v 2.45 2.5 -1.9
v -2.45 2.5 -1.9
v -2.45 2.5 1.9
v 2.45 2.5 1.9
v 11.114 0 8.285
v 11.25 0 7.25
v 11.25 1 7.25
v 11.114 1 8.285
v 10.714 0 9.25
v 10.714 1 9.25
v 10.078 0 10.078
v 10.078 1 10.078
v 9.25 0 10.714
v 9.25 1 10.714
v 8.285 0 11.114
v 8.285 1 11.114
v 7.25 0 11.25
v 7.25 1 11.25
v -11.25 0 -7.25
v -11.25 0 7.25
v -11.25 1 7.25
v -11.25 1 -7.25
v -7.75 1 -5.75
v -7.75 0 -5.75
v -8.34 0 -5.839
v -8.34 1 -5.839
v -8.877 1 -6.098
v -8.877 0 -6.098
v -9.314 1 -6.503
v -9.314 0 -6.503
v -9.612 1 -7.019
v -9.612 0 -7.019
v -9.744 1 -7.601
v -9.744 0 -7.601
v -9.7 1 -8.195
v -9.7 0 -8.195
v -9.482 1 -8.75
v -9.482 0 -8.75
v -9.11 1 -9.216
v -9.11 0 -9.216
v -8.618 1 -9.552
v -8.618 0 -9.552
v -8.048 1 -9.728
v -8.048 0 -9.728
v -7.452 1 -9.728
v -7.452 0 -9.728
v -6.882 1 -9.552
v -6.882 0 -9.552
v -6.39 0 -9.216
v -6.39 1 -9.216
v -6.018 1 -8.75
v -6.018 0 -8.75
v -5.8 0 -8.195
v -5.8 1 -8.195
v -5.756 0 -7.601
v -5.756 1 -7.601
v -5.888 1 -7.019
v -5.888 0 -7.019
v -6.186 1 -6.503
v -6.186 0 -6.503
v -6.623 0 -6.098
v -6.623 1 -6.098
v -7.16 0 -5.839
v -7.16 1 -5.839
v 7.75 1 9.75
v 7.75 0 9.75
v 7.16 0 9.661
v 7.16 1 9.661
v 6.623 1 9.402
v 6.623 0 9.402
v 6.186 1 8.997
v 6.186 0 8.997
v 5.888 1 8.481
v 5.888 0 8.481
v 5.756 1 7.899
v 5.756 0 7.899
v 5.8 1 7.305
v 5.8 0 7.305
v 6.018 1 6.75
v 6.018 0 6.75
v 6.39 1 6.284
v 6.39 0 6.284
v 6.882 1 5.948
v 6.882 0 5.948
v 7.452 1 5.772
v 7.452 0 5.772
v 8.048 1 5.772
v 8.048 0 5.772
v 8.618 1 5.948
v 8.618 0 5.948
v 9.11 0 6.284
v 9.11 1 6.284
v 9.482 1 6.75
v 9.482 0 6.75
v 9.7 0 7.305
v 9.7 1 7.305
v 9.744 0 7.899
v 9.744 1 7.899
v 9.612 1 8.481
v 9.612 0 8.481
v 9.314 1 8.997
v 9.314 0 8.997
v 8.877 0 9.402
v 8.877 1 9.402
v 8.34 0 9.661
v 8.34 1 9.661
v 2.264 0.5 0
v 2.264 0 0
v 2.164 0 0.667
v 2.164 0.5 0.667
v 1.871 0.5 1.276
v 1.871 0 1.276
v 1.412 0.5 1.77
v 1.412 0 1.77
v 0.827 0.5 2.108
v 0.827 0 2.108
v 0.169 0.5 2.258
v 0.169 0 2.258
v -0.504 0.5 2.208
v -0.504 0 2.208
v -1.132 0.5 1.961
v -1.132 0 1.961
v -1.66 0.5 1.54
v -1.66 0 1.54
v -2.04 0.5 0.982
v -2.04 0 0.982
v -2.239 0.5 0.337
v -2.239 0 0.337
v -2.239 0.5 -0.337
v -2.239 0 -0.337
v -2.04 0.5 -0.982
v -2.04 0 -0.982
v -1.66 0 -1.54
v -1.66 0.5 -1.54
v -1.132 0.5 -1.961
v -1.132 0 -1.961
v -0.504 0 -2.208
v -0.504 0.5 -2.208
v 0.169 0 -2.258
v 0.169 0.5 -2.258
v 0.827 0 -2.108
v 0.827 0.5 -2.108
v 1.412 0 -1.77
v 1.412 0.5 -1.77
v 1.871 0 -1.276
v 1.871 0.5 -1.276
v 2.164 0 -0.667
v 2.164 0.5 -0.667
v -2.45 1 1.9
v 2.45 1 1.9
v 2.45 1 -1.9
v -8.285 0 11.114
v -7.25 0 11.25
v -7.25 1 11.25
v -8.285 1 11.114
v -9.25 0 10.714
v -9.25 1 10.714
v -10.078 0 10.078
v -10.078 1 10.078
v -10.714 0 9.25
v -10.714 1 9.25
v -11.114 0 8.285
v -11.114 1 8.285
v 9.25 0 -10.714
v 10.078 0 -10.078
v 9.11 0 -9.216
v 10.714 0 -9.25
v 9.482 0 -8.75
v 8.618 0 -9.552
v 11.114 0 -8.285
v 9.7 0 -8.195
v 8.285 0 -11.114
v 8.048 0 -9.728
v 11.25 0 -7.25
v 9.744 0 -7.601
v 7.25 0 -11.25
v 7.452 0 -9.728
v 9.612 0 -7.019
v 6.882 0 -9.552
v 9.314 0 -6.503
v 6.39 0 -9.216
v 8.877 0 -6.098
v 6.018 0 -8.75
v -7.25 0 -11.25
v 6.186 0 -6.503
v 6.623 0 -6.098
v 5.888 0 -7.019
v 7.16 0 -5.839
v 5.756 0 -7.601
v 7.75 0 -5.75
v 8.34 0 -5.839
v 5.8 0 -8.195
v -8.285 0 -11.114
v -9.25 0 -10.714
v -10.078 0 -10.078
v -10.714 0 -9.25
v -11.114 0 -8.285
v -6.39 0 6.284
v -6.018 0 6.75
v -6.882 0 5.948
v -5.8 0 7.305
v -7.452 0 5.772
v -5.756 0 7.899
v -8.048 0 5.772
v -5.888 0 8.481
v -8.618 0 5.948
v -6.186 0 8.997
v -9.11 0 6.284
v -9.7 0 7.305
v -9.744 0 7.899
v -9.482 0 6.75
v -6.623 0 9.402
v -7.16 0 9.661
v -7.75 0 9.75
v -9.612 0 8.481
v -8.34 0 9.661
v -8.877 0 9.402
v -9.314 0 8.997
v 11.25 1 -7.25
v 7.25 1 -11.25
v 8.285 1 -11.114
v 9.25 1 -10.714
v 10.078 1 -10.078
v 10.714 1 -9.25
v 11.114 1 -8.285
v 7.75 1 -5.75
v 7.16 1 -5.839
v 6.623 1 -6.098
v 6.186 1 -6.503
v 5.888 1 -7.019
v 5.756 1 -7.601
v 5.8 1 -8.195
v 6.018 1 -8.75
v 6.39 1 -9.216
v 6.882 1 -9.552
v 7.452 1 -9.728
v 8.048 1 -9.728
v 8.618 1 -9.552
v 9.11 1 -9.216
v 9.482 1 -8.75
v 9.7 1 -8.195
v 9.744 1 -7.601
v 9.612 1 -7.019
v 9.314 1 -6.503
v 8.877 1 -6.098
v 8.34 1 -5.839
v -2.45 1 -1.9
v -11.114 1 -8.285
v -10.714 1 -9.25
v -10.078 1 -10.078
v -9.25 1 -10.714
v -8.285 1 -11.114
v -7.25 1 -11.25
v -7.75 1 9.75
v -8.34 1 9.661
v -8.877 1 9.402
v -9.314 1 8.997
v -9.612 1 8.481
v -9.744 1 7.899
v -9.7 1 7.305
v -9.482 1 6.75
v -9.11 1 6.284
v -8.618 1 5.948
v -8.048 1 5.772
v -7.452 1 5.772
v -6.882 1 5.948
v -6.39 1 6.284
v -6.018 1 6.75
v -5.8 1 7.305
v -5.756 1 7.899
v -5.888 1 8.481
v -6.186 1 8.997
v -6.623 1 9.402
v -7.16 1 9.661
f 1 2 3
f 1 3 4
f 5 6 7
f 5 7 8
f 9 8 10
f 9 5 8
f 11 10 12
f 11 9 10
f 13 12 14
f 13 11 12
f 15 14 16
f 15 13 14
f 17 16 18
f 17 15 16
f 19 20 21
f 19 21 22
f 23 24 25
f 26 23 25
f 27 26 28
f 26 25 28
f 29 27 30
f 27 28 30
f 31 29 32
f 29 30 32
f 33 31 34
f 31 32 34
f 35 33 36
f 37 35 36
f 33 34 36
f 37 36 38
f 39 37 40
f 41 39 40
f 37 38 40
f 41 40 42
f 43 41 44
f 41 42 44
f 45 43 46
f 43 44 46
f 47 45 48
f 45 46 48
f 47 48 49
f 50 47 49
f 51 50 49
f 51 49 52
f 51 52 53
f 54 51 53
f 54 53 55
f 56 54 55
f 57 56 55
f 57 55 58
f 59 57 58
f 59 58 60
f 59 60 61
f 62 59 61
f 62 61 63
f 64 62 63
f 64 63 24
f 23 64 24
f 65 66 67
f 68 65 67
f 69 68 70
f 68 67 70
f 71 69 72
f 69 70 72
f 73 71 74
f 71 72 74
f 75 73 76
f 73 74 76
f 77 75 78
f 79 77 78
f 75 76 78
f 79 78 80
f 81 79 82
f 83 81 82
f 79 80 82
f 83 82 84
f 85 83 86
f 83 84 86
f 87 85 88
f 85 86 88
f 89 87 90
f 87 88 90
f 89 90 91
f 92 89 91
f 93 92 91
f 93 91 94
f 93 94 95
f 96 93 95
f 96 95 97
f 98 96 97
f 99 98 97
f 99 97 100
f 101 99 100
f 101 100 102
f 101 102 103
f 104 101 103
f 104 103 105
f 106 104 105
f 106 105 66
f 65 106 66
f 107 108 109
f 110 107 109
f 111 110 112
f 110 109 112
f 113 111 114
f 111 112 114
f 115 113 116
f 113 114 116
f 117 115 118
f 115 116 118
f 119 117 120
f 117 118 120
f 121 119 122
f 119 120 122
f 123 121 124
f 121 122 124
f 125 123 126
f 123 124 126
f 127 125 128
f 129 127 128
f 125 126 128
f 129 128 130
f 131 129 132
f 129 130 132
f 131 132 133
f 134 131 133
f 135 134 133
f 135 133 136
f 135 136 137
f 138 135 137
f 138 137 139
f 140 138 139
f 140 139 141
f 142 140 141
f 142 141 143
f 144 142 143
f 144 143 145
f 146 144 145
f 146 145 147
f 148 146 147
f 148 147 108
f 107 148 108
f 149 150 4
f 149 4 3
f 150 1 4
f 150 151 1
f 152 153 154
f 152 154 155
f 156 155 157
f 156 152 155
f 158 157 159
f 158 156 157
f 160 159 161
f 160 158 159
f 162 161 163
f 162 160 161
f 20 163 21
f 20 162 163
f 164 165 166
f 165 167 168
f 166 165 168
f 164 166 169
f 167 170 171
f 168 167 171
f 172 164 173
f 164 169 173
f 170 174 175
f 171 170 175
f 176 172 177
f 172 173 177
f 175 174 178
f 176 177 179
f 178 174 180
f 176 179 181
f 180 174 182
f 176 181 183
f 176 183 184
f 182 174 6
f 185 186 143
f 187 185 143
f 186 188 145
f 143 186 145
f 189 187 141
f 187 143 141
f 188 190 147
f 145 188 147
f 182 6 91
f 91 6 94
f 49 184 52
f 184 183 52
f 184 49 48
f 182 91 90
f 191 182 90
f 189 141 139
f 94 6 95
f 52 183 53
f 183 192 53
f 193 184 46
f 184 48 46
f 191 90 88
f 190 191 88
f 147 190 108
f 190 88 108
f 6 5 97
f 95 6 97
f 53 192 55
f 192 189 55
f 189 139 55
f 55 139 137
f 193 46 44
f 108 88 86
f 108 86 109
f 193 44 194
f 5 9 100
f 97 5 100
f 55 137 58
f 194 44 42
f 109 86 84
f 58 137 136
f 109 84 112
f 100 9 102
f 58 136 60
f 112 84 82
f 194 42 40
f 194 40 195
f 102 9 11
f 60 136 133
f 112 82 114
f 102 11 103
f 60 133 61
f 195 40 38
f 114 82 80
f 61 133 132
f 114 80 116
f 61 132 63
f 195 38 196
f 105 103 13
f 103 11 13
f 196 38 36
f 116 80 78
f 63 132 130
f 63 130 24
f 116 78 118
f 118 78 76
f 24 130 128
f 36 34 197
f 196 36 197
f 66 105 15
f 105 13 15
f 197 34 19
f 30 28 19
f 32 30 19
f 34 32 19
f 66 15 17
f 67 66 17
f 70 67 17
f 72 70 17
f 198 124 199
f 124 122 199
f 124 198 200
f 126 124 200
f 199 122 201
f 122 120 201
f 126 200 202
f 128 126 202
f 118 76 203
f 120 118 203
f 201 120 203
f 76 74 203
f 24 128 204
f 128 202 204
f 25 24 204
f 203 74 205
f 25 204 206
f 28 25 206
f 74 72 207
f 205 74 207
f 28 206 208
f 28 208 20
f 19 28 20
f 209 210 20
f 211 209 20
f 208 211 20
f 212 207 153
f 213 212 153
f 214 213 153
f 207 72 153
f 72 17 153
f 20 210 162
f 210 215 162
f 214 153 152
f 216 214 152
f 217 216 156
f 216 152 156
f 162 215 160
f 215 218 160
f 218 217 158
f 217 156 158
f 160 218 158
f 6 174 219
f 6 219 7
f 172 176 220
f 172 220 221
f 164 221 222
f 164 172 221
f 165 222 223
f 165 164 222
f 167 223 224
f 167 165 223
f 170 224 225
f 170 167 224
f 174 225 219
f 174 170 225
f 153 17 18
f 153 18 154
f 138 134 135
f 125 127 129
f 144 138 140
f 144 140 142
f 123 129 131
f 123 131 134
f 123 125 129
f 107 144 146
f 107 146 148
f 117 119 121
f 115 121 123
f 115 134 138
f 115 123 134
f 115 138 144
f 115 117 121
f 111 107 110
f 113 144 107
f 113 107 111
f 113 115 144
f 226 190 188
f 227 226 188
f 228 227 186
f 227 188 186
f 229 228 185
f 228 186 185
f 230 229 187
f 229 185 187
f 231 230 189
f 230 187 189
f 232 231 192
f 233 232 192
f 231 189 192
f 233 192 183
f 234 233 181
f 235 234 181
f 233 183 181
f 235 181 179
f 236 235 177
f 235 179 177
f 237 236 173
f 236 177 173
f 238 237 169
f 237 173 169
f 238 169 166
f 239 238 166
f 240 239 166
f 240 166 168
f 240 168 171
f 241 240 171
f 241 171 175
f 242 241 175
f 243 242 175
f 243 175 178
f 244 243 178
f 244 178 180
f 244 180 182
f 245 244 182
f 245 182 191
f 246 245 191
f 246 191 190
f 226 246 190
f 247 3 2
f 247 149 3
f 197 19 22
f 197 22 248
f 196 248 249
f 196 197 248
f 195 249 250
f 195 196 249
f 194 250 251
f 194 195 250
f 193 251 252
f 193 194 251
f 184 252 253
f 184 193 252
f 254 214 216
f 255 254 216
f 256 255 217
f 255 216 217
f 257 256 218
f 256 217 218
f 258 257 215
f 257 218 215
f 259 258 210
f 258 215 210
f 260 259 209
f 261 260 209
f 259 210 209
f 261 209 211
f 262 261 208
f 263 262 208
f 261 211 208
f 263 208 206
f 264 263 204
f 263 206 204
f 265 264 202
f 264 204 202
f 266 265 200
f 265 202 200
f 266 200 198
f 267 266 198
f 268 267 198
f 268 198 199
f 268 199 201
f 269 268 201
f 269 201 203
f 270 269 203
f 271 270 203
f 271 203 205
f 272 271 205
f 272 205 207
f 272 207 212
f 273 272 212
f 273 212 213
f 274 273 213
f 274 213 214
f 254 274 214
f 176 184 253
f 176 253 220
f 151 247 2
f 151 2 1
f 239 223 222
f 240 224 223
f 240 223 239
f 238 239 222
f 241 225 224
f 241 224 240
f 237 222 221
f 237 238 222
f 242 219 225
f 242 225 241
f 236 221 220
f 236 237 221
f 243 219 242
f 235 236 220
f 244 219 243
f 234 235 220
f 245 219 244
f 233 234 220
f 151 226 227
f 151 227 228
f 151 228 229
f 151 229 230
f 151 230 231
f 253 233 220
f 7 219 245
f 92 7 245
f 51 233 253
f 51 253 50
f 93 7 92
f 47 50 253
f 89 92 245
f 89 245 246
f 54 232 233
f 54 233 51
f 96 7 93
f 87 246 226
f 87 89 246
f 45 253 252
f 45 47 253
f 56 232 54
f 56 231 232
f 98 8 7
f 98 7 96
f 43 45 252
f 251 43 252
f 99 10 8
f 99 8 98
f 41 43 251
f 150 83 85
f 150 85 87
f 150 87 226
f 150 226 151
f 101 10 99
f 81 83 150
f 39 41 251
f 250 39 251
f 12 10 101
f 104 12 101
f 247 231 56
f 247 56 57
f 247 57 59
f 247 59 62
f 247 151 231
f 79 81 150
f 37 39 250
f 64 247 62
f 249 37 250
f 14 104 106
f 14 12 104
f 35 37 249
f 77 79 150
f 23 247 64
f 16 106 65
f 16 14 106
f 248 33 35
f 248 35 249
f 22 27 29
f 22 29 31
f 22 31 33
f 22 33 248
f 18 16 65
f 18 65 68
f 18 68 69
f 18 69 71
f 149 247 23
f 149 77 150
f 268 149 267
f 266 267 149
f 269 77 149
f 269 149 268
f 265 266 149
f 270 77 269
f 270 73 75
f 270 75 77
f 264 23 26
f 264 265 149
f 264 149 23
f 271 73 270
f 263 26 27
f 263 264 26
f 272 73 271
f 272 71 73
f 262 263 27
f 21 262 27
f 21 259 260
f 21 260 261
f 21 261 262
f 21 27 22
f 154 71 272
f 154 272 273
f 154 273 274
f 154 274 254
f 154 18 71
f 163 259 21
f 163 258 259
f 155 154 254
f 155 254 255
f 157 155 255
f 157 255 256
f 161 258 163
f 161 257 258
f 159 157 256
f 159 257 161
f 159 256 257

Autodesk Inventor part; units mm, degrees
ref_plane "YZ Plane" through (0, 0, 0) normal (1, 0, 0) x (0, 1, 0)
ref_plane "XZ Plane" through (0, 0, 0) normal (0, 1, 0) x (-1, 0, 0)
ref_plane "XY Plane" through (0, 0, 0) normal (0, 0, 1) x (1, 0, 0)
sketch "Skizze1" plane through (0, 0, 0) normal (0, 1, 0) x (-1, 0, 0)
  line L0 (7.25, -11.25) -> (-7.25, -11.25)
  line L1 (-11.25, -7.25) -> (-11.25, 7.25)
  line L2 (-7.25, 11.25) -> (7.25, 11.25)
  line L3 (11.25, 7.25) -> (11.25, -7.25)
  line L4 (11.25, -11.25) -> (-11.25, 11.25) construction
  line L5 (-11.25, -11.25) -> (11.25, 11.25) construction
  arc A0 (-7.25, 11.25) -> (-11.25, 7.25) centre (-7.25, 7.25) ccw
  arc A1 (11.25, 7.25) -> (7.25, 11.25) centre (7.25, 7.25) ccw
  arc A2 (7.25, -11.25) -> (11.25, -7.25) centre (7.25, -7.25) ccw
  arc A3 (-11.25, -7.25) -> (-7.25, -11.25) centre (-7.25, -7.25) ccw
  point P0 (0, 0)
  dimension "d0" = 22.5
  dimension "d1" = 22.5
  dimension "d2" = 4
extrude "Extrusion1" add sketch "Skizze1" along normal blind 1
sketch "Skizze2" plane through (0, 1, 0) normal (0, 1, 0) x (1, 0, 0)
  line L0 (-7.25, -11.25) -> (7.25, -11.25) projected
  arc A0 (7.25, -11.25) -> (11.25, -7.25) centre (7.25, -7.25) ccw projected
  line L1 (11.25, -7.25) -> (11.25, 7.25) projected
  arc A1 (11.25, 7.25) -> (7.25, 11.25) centre (7.25, 7.25) ccw projected
  line L2 (7.25, 11.25) -> (-7.25, 11.25) projected
  arc A2 (-7.25, 11.25) -> (-11.25, 7.25) centre (-7.25, 7.25) ccw projected
  line L3 (-11.25, 7.25) -> (-11.25, -7.25) projected
  arc A3 (-11.25, -7.25) -> (-7.25, -11.25) centre (-7.25, -7.25) ccw projected
  line L4 (2.45, -1.9) -> (-2.45, -1.9)
  line L5 (-2.45, -1.9) -> (-2.45, 1.9)
  line L6 (-2.45, 1.9) -> (2.45, 1.9)
  line L7 (2.45, 1.9) -> (2.45, -1.9)
  line L8 (2.45, -1.9) -> (-2.45, 1.9) construction
  line L9 (-2.45, -1.9) -> (2.45, 1.9) construction
  point P0 (0, 0)
  dimension "d5" = 4.9
  dimension "d6" = 3.8
extrude "Extrusion2" add sketch "Skizze2" along normal blind 1.5 contours L4 L5 L6 L7
sketch "Skizze3" plane through (0, 1, 0) normal (0, 1, 0) x (1, 0, 0)
  line L0 (2.45, 1.9) -> (2.45, -1.9) projected
  line L1 (2.45, -1.9) -> (-2.45, -1.9) projected
  line L2 (-2.45, -1.9) -> (-2.45, 1.9) projected
  line L3 (-2.45, 1.9) -> (2.45, 1.9) projected
  line L4 (-7.25, -11.25) -> (7.25, -11.25) projected
  arc A0 (7.25, -11.25) -> (11.25, -7.25) centre (7.25, -7.25) ccw projected
  line L5 (11.25, -7.25) -> (11.25, 7.25) projected
  arc A1 (11.25, 7.25) -> (7.25, 11.25) centre (7.25, 7.25) ccw projected
  line L6 (7.25, 11.25) -> (-7.25, 11.25) projected
  arc A2 (-7.25, 11.25) -> (-11.25, 7.25) centre (-7.25, 7.25) ccw projected
  line L7 (-11.25, 7.25) -> (-11.25, -7.25) projected
  arc A3 (-11.25, -7.25) -> (-7.25, -11.25) centre (-7.25, -7.25) ccw projected
  line L8 (-7.75, 7.75) -> (7.75, 7.75) construction
  line L9 (7.75, 7.75) -> (7.75, -7.75) construction
  line L10 (7.75, -7.75) -> (-7.75, -7.75) construction
  line L11 (-7.75, -7.75) -> (-7.75, 7.75) construction
  line L12 (-7.75, 7.75) -> (7.75, -7.75) construction
  line L13 (7.75, 7.75) -> (-7.75, -7.75) construction
  point P0 (0, 0)
  dimension "d9" = 15.5
  dimension "d10" = 15.5
hole "Bohrung1" at (7.75, 1, 7.75) at (-7.75, 1, 7.75) at (-7.75, 1, -7.75) at (7.75, 1, -7.75) direction (0, -1, 0) diameter 4 depth 3 tip angle 118
sketch "Skizze4" plane through (0, 0, 0) normal (0, -1, 0) x (1, 0, 0)
  circle A0 centre (0, 0) radius 2.2643
extrude "Extrusion3" cut sketch "Skizze4" against normal blind 0.5
properties part number "00_AS5600_rotational_encoder_i2c"
